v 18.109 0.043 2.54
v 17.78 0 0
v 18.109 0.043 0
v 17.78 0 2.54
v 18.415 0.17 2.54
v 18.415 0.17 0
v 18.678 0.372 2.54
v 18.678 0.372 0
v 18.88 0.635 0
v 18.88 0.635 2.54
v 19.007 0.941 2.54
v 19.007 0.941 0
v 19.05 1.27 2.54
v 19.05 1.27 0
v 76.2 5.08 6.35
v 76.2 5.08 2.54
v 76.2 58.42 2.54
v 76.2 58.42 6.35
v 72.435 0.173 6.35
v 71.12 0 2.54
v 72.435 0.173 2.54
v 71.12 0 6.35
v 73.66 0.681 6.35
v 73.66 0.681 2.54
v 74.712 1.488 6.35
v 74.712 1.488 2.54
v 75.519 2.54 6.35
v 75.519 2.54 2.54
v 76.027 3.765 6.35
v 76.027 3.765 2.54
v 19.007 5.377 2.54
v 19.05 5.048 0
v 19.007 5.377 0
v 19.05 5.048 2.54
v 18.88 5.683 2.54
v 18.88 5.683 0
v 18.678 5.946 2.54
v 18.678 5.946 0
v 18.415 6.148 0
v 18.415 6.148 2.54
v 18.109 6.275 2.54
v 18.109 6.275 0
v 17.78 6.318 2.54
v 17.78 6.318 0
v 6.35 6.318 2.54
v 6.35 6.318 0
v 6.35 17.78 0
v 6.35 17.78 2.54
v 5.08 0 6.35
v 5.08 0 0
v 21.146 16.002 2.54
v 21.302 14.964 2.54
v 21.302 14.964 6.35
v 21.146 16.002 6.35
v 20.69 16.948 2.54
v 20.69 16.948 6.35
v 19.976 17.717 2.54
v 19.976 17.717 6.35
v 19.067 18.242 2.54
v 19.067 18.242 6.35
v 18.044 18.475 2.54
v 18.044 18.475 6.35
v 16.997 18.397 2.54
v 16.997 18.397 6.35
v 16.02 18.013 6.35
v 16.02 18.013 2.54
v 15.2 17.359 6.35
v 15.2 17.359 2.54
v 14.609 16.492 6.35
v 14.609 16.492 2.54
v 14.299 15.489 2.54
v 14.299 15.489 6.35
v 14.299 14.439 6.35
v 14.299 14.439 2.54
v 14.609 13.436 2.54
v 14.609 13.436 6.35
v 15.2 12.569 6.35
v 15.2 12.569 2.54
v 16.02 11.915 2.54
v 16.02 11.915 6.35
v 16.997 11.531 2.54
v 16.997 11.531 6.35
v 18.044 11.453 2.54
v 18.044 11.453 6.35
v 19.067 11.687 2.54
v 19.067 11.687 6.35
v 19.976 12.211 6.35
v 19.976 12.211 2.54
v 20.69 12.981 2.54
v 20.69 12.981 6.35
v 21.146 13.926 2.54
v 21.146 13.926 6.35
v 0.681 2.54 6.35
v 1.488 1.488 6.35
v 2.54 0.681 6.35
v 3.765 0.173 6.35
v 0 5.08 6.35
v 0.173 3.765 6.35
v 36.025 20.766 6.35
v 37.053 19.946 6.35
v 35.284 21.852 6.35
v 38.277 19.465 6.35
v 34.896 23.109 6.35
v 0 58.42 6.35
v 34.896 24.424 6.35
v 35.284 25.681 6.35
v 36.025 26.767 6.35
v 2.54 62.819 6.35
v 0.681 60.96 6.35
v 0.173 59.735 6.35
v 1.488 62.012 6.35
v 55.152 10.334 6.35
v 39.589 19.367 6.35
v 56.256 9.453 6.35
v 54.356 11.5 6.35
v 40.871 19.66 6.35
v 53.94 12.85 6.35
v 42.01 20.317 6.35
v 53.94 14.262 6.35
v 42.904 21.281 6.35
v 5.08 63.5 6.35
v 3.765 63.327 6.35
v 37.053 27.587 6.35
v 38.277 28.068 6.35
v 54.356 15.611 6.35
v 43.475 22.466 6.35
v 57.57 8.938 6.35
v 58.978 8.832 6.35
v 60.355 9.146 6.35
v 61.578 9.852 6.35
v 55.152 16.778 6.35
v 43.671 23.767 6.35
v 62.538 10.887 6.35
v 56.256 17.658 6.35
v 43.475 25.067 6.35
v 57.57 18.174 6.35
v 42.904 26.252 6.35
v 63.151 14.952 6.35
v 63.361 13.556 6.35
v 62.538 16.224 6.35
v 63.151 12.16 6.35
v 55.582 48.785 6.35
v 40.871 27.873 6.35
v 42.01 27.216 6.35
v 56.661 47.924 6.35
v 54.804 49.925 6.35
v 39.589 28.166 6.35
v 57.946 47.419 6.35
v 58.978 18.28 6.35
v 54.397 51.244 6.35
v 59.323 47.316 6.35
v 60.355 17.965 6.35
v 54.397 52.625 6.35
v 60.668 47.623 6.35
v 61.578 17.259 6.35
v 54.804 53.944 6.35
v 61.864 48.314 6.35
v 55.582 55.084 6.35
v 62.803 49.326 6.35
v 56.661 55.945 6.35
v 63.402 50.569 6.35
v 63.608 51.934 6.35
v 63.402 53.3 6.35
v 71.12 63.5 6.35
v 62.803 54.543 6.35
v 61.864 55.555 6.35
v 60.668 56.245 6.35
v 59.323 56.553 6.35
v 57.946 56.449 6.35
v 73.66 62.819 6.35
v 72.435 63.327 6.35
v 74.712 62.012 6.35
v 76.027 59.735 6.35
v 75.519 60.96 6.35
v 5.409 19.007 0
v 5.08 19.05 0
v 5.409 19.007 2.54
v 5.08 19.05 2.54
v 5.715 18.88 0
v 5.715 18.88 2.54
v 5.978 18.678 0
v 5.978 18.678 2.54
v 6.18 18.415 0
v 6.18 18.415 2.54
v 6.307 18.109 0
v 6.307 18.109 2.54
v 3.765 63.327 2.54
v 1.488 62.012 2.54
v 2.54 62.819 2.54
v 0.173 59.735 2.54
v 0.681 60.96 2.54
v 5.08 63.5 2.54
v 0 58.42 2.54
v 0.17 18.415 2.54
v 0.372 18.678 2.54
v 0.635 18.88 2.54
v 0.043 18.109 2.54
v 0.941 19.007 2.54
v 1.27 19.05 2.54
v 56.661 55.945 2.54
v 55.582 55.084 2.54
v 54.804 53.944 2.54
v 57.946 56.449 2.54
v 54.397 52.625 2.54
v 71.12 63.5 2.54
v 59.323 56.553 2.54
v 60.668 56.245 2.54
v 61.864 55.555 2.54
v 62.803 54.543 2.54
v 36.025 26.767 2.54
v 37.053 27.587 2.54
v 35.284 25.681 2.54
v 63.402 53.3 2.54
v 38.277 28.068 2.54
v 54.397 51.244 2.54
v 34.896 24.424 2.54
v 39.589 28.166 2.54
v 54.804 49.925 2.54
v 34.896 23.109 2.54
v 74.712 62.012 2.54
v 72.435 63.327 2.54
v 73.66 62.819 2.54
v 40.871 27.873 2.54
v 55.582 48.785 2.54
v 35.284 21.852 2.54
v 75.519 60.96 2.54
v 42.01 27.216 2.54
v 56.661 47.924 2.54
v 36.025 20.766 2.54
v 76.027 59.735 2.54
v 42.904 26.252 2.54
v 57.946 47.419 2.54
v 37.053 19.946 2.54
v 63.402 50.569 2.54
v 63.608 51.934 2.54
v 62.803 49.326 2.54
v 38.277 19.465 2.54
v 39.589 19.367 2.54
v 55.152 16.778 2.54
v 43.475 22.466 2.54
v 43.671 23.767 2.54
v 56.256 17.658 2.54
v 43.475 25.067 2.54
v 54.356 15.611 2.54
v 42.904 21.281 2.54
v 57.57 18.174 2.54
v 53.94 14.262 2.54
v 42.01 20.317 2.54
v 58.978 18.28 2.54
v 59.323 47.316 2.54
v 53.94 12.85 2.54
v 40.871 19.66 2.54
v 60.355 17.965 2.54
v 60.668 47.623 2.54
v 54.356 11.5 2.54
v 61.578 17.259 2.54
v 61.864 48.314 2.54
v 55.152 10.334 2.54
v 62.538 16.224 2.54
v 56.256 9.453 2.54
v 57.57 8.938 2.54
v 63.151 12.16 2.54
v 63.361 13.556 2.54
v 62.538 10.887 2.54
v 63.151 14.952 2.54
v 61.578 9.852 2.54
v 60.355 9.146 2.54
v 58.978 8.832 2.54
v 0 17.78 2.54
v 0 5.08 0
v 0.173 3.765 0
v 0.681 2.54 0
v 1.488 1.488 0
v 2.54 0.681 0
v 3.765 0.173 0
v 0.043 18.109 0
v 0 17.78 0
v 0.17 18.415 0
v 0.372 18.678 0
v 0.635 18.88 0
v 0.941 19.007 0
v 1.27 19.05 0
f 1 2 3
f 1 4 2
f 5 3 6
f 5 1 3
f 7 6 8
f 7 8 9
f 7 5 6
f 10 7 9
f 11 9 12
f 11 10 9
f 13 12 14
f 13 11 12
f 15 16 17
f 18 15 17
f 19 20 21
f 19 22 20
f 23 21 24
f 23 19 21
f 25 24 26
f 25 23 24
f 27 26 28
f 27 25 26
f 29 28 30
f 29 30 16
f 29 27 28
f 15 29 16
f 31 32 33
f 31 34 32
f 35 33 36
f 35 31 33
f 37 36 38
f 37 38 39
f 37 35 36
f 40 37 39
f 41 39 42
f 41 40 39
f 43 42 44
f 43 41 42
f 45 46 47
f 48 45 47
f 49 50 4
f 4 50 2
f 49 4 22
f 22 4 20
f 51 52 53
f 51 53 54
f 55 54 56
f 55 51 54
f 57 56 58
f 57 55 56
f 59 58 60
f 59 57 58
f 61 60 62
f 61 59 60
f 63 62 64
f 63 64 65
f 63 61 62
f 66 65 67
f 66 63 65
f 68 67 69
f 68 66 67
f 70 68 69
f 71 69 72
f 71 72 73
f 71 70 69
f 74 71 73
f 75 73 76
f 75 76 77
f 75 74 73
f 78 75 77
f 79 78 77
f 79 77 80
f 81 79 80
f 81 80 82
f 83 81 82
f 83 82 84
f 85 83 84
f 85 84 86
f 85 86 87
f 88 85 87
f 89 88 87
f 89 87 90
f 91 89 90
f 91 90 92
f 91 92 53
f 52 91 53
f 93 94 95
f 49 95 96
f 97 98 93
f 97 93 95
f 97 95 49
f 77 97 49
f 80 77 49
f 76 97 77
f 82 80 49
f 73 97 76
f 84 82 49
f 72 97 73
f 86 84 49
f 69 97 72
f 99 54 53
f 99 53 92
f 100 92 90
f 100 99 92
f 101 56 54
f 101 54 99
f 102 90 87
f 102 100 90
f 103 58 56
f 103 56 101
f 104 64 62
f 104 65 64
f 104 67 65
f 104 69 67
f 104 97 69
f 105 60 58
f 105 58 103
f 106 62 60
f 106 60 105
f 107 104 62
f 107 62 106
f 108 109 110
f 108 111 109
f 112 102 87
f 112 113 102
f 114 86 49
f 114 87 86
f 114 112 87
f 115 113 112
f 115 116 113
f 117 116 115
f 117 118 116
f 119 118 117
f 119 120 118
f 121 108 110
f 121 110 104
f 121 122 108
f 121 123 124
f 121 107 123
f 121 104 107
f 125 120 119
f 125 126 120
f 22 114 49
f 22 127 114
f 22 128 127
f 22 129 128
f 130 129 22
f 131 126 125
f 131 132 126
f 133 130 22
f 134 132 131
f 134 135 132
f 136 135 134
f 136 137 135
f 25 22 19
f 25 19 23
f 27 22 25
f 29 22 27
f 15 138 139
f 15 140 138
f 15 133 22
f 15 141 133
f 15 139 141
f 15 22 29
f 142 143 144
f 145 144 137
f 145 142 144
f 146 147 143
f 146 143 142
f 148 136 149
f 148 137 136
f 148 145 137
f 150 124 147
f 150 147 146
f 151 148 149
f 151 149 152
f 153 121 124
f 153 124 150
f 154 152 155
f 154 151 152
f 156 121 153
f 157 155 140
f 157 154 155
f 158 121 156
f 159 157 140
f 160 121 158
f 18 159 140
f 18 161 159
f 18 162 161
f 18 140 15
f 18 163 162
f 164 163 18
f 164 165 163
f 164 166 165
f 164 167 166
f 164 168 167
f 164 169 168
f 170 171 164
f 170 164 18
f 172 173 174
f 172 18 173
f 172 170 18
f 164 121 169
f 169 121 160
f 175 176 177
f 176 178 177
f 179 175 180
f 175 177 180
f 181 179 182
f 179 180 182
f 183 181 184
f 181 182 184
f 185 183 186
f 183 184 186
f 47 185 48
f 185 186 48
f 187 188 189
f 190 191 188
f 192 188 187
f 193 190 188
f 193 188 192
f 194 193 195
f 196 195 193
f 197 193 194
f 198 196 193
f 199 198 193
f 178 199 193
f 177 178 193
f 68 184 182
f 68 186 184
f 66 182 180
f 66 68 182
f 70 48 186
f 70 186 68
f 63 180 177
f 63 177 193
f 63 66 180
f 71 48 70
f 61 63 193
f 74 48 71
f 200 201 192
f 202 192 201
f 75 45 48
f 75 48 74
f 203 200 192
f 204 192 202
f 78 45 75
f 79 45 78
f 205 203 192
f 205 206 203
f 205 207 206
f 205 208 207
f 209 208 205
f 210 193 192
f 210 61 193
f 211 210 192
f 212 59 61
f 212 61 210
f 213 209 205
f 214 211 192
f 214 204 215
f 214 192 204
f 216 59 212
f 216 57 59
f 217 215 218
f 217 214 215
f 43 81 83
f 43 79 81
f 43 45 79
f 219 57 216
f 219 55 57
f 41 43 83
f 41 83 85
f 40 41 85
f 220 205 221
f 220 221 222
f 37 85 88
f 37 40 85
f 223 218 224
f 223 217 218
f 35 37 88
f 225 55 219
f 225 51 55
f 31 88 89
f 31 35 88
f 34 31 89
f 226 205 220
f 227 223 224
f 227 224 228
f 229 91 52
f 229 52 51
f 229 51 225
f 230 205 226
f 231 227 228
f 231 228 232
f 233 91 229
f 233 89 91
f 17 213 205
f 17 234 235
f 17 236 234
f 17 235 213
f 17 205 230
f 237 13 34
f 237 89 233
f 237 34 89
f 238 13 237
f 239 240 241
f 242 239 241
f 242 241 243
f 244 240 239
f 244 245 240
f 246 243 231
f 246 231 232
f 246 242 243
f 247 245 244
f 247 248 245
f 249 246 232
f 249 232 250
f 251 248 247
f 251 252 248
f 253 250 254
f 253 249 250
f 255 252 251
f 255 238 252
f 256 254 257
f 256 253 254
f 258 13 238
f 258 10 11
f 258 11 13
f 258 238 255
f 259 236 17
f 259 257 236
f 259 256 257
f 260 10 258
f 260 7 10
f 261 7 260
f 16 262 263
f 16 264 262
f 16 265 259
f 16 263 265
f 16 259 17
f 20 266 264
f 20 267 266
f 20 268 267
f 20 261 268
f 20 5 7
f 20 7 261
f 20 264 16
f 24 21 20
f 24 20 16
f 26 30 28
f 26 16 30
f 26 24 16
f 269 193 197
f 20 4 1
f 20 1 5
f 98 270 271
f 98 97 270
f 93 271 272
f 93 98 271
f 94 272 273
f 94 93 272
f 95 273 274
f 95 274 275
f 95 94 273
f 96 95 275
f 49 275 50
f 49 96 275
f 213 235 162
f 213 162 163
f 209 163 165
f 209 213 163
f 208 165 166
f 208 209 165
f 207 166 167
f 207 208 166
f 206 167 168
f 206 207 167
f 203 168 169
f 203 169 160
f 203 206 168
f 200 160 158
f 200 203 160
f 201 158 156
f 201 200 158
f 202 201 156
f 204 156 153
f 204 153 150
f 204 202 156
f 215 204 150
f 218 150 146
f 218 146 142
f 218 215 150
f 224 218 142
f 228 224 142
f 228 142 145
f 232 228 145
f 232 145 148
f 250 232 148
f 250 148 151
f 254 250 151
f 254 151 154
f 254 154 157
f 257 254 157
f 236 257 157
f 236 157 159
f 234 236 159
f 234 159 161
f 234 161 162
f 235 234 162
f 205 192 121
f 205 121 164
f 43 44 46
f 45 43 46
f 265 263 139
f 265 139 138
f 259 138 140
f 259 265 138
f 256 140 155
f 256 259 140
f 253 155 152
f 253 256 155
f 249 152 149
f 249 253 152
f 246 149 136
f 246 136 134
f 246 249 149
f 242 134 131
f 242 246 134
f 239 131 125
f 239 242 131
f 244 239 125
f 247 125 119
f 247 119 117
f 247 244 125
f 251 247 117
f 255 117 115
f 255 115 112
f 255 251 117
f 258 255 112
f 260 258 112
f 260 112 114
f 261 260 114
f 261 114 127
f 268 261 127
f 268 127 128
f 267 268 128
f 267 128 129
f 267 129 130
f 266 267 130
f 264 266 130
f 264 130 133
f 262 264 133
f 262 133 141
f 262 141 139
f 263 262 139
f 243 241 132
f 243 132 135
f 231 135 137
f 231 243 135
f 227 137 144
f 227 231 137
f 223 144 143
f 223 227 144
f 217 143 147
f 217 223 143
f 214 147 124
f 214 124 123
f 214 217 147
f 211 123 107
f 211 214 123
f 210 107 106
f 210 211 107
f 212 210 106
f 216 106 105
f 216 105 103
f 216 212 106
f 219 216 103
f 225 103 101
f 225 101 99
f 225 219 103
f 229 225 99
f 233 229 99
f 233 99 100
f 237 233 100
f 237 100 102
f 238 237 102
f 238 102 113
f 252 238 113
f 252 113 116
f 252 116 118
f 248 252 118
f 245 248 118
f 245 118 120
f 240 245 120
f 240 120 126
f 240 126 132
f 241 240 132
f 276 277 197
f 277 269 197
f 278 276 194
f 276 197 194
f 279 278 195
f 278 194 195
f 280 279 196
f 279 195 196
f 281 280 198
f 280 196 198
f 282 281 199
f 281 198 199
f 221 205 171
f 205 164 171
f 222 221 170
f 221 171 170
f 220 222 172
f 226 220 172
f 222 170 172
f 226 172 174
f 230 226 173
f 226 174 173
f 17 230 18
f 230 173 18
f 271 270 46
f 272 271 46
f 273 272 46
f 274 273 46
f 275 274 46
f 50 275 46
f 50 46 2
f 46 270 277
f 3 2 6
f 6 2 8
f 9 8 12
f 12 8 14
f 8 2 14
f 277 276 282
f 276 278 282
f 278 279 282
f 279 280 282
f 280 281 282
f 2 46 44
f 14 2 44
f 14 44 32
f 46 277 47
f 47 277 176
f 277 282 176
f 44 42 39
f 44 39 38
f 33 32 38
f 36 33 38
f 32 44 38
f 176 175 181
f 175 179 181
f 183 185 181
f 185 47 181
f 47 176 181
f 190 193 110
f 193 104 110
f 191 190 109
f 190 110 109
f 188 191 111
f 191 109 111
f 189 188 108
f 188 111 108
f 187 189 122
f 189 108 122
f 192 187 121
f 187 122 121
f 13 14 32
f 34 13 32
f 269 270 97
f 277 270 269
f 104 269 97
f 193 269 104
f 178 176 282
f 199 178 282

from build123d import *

# Parameters (mm, degrees)
F0_W     = 76.2
F0_H     = 63.5
F0_R     = 3.5209789872
F0_R_2   = 4.7369922421
F0_R_3   = 4.4117780633
F0_R_4   = 4.6311273859
F1_DEPTH = 6.35
F3_DEPTH = 2.54
F4_R     = 5.08
F5_R     = 1.27


with BuildPart() as f1:
    # F0 (on Top) → F1 (new body)
    with BuildSketch(Plane.XY):
        with Locations((38.1, 31.75)):
            Rectangle(F0_W, F0_H)
        with Locations((17.7809670568, 14.9641726166)):
            Circle(F0_R, mode=Mode.SUBTRACT)
        with Locations((58.6243532598, 13.5557809845)):
            Circle(F0_R_2, mode=Mode.SUBTRACT)
        with Locations((39.2589494586, 23.7666256726)):
            Circle(F0_R_3, mode=Mode.SUBTRACT)
        with Locations((58.9764490724, 51.9344769418)):
            Circle(F0_R_4, mode=Mode.SUBTRACT)
    extrude(amount=F1_DEPTH)

    # F2 (on face) → F3 (cut)
    with BuildSketch(Plane(origin=(0, 0, 0), x_dir=(1, 0, 0), z_dir=(0, 0, -1))):
        Polygon((19.05, -6.3181049854), (6.3500011563, -6.3181049854), (6.3500011563, -19.05), (0, -19.05), (0, -63.5), (76.2, -63.5), (76.2, 0), (19.05, 0), align=None)
    extrude(amount=-F3_DEPTH, mode=Mode.SUBTRACT)

    # F4
    f4_edges = [f1.edges().sort_by_distance(p)[0] for p in [
        (0, 63.5, 4.445),
        (76.2, 63.5, 4.445),
        (76.2, 0, 4.445),
        (0, 0, 3.175),
    ]]
    fillet(f4_edges, radius=F4_R)

    # F5
    f5_edges = [f1.edges().sort_by_distance(p)[0] for p in [
        (6.350001, 19.05, 1.27),
        (19.05, 6.318105, 1.27),
        (0, 19.05, 1.27),
        (19.05, 0, 1.27),
    ]]
    fillet(f5_edges, radius=F5_R)


solid = f1.part
